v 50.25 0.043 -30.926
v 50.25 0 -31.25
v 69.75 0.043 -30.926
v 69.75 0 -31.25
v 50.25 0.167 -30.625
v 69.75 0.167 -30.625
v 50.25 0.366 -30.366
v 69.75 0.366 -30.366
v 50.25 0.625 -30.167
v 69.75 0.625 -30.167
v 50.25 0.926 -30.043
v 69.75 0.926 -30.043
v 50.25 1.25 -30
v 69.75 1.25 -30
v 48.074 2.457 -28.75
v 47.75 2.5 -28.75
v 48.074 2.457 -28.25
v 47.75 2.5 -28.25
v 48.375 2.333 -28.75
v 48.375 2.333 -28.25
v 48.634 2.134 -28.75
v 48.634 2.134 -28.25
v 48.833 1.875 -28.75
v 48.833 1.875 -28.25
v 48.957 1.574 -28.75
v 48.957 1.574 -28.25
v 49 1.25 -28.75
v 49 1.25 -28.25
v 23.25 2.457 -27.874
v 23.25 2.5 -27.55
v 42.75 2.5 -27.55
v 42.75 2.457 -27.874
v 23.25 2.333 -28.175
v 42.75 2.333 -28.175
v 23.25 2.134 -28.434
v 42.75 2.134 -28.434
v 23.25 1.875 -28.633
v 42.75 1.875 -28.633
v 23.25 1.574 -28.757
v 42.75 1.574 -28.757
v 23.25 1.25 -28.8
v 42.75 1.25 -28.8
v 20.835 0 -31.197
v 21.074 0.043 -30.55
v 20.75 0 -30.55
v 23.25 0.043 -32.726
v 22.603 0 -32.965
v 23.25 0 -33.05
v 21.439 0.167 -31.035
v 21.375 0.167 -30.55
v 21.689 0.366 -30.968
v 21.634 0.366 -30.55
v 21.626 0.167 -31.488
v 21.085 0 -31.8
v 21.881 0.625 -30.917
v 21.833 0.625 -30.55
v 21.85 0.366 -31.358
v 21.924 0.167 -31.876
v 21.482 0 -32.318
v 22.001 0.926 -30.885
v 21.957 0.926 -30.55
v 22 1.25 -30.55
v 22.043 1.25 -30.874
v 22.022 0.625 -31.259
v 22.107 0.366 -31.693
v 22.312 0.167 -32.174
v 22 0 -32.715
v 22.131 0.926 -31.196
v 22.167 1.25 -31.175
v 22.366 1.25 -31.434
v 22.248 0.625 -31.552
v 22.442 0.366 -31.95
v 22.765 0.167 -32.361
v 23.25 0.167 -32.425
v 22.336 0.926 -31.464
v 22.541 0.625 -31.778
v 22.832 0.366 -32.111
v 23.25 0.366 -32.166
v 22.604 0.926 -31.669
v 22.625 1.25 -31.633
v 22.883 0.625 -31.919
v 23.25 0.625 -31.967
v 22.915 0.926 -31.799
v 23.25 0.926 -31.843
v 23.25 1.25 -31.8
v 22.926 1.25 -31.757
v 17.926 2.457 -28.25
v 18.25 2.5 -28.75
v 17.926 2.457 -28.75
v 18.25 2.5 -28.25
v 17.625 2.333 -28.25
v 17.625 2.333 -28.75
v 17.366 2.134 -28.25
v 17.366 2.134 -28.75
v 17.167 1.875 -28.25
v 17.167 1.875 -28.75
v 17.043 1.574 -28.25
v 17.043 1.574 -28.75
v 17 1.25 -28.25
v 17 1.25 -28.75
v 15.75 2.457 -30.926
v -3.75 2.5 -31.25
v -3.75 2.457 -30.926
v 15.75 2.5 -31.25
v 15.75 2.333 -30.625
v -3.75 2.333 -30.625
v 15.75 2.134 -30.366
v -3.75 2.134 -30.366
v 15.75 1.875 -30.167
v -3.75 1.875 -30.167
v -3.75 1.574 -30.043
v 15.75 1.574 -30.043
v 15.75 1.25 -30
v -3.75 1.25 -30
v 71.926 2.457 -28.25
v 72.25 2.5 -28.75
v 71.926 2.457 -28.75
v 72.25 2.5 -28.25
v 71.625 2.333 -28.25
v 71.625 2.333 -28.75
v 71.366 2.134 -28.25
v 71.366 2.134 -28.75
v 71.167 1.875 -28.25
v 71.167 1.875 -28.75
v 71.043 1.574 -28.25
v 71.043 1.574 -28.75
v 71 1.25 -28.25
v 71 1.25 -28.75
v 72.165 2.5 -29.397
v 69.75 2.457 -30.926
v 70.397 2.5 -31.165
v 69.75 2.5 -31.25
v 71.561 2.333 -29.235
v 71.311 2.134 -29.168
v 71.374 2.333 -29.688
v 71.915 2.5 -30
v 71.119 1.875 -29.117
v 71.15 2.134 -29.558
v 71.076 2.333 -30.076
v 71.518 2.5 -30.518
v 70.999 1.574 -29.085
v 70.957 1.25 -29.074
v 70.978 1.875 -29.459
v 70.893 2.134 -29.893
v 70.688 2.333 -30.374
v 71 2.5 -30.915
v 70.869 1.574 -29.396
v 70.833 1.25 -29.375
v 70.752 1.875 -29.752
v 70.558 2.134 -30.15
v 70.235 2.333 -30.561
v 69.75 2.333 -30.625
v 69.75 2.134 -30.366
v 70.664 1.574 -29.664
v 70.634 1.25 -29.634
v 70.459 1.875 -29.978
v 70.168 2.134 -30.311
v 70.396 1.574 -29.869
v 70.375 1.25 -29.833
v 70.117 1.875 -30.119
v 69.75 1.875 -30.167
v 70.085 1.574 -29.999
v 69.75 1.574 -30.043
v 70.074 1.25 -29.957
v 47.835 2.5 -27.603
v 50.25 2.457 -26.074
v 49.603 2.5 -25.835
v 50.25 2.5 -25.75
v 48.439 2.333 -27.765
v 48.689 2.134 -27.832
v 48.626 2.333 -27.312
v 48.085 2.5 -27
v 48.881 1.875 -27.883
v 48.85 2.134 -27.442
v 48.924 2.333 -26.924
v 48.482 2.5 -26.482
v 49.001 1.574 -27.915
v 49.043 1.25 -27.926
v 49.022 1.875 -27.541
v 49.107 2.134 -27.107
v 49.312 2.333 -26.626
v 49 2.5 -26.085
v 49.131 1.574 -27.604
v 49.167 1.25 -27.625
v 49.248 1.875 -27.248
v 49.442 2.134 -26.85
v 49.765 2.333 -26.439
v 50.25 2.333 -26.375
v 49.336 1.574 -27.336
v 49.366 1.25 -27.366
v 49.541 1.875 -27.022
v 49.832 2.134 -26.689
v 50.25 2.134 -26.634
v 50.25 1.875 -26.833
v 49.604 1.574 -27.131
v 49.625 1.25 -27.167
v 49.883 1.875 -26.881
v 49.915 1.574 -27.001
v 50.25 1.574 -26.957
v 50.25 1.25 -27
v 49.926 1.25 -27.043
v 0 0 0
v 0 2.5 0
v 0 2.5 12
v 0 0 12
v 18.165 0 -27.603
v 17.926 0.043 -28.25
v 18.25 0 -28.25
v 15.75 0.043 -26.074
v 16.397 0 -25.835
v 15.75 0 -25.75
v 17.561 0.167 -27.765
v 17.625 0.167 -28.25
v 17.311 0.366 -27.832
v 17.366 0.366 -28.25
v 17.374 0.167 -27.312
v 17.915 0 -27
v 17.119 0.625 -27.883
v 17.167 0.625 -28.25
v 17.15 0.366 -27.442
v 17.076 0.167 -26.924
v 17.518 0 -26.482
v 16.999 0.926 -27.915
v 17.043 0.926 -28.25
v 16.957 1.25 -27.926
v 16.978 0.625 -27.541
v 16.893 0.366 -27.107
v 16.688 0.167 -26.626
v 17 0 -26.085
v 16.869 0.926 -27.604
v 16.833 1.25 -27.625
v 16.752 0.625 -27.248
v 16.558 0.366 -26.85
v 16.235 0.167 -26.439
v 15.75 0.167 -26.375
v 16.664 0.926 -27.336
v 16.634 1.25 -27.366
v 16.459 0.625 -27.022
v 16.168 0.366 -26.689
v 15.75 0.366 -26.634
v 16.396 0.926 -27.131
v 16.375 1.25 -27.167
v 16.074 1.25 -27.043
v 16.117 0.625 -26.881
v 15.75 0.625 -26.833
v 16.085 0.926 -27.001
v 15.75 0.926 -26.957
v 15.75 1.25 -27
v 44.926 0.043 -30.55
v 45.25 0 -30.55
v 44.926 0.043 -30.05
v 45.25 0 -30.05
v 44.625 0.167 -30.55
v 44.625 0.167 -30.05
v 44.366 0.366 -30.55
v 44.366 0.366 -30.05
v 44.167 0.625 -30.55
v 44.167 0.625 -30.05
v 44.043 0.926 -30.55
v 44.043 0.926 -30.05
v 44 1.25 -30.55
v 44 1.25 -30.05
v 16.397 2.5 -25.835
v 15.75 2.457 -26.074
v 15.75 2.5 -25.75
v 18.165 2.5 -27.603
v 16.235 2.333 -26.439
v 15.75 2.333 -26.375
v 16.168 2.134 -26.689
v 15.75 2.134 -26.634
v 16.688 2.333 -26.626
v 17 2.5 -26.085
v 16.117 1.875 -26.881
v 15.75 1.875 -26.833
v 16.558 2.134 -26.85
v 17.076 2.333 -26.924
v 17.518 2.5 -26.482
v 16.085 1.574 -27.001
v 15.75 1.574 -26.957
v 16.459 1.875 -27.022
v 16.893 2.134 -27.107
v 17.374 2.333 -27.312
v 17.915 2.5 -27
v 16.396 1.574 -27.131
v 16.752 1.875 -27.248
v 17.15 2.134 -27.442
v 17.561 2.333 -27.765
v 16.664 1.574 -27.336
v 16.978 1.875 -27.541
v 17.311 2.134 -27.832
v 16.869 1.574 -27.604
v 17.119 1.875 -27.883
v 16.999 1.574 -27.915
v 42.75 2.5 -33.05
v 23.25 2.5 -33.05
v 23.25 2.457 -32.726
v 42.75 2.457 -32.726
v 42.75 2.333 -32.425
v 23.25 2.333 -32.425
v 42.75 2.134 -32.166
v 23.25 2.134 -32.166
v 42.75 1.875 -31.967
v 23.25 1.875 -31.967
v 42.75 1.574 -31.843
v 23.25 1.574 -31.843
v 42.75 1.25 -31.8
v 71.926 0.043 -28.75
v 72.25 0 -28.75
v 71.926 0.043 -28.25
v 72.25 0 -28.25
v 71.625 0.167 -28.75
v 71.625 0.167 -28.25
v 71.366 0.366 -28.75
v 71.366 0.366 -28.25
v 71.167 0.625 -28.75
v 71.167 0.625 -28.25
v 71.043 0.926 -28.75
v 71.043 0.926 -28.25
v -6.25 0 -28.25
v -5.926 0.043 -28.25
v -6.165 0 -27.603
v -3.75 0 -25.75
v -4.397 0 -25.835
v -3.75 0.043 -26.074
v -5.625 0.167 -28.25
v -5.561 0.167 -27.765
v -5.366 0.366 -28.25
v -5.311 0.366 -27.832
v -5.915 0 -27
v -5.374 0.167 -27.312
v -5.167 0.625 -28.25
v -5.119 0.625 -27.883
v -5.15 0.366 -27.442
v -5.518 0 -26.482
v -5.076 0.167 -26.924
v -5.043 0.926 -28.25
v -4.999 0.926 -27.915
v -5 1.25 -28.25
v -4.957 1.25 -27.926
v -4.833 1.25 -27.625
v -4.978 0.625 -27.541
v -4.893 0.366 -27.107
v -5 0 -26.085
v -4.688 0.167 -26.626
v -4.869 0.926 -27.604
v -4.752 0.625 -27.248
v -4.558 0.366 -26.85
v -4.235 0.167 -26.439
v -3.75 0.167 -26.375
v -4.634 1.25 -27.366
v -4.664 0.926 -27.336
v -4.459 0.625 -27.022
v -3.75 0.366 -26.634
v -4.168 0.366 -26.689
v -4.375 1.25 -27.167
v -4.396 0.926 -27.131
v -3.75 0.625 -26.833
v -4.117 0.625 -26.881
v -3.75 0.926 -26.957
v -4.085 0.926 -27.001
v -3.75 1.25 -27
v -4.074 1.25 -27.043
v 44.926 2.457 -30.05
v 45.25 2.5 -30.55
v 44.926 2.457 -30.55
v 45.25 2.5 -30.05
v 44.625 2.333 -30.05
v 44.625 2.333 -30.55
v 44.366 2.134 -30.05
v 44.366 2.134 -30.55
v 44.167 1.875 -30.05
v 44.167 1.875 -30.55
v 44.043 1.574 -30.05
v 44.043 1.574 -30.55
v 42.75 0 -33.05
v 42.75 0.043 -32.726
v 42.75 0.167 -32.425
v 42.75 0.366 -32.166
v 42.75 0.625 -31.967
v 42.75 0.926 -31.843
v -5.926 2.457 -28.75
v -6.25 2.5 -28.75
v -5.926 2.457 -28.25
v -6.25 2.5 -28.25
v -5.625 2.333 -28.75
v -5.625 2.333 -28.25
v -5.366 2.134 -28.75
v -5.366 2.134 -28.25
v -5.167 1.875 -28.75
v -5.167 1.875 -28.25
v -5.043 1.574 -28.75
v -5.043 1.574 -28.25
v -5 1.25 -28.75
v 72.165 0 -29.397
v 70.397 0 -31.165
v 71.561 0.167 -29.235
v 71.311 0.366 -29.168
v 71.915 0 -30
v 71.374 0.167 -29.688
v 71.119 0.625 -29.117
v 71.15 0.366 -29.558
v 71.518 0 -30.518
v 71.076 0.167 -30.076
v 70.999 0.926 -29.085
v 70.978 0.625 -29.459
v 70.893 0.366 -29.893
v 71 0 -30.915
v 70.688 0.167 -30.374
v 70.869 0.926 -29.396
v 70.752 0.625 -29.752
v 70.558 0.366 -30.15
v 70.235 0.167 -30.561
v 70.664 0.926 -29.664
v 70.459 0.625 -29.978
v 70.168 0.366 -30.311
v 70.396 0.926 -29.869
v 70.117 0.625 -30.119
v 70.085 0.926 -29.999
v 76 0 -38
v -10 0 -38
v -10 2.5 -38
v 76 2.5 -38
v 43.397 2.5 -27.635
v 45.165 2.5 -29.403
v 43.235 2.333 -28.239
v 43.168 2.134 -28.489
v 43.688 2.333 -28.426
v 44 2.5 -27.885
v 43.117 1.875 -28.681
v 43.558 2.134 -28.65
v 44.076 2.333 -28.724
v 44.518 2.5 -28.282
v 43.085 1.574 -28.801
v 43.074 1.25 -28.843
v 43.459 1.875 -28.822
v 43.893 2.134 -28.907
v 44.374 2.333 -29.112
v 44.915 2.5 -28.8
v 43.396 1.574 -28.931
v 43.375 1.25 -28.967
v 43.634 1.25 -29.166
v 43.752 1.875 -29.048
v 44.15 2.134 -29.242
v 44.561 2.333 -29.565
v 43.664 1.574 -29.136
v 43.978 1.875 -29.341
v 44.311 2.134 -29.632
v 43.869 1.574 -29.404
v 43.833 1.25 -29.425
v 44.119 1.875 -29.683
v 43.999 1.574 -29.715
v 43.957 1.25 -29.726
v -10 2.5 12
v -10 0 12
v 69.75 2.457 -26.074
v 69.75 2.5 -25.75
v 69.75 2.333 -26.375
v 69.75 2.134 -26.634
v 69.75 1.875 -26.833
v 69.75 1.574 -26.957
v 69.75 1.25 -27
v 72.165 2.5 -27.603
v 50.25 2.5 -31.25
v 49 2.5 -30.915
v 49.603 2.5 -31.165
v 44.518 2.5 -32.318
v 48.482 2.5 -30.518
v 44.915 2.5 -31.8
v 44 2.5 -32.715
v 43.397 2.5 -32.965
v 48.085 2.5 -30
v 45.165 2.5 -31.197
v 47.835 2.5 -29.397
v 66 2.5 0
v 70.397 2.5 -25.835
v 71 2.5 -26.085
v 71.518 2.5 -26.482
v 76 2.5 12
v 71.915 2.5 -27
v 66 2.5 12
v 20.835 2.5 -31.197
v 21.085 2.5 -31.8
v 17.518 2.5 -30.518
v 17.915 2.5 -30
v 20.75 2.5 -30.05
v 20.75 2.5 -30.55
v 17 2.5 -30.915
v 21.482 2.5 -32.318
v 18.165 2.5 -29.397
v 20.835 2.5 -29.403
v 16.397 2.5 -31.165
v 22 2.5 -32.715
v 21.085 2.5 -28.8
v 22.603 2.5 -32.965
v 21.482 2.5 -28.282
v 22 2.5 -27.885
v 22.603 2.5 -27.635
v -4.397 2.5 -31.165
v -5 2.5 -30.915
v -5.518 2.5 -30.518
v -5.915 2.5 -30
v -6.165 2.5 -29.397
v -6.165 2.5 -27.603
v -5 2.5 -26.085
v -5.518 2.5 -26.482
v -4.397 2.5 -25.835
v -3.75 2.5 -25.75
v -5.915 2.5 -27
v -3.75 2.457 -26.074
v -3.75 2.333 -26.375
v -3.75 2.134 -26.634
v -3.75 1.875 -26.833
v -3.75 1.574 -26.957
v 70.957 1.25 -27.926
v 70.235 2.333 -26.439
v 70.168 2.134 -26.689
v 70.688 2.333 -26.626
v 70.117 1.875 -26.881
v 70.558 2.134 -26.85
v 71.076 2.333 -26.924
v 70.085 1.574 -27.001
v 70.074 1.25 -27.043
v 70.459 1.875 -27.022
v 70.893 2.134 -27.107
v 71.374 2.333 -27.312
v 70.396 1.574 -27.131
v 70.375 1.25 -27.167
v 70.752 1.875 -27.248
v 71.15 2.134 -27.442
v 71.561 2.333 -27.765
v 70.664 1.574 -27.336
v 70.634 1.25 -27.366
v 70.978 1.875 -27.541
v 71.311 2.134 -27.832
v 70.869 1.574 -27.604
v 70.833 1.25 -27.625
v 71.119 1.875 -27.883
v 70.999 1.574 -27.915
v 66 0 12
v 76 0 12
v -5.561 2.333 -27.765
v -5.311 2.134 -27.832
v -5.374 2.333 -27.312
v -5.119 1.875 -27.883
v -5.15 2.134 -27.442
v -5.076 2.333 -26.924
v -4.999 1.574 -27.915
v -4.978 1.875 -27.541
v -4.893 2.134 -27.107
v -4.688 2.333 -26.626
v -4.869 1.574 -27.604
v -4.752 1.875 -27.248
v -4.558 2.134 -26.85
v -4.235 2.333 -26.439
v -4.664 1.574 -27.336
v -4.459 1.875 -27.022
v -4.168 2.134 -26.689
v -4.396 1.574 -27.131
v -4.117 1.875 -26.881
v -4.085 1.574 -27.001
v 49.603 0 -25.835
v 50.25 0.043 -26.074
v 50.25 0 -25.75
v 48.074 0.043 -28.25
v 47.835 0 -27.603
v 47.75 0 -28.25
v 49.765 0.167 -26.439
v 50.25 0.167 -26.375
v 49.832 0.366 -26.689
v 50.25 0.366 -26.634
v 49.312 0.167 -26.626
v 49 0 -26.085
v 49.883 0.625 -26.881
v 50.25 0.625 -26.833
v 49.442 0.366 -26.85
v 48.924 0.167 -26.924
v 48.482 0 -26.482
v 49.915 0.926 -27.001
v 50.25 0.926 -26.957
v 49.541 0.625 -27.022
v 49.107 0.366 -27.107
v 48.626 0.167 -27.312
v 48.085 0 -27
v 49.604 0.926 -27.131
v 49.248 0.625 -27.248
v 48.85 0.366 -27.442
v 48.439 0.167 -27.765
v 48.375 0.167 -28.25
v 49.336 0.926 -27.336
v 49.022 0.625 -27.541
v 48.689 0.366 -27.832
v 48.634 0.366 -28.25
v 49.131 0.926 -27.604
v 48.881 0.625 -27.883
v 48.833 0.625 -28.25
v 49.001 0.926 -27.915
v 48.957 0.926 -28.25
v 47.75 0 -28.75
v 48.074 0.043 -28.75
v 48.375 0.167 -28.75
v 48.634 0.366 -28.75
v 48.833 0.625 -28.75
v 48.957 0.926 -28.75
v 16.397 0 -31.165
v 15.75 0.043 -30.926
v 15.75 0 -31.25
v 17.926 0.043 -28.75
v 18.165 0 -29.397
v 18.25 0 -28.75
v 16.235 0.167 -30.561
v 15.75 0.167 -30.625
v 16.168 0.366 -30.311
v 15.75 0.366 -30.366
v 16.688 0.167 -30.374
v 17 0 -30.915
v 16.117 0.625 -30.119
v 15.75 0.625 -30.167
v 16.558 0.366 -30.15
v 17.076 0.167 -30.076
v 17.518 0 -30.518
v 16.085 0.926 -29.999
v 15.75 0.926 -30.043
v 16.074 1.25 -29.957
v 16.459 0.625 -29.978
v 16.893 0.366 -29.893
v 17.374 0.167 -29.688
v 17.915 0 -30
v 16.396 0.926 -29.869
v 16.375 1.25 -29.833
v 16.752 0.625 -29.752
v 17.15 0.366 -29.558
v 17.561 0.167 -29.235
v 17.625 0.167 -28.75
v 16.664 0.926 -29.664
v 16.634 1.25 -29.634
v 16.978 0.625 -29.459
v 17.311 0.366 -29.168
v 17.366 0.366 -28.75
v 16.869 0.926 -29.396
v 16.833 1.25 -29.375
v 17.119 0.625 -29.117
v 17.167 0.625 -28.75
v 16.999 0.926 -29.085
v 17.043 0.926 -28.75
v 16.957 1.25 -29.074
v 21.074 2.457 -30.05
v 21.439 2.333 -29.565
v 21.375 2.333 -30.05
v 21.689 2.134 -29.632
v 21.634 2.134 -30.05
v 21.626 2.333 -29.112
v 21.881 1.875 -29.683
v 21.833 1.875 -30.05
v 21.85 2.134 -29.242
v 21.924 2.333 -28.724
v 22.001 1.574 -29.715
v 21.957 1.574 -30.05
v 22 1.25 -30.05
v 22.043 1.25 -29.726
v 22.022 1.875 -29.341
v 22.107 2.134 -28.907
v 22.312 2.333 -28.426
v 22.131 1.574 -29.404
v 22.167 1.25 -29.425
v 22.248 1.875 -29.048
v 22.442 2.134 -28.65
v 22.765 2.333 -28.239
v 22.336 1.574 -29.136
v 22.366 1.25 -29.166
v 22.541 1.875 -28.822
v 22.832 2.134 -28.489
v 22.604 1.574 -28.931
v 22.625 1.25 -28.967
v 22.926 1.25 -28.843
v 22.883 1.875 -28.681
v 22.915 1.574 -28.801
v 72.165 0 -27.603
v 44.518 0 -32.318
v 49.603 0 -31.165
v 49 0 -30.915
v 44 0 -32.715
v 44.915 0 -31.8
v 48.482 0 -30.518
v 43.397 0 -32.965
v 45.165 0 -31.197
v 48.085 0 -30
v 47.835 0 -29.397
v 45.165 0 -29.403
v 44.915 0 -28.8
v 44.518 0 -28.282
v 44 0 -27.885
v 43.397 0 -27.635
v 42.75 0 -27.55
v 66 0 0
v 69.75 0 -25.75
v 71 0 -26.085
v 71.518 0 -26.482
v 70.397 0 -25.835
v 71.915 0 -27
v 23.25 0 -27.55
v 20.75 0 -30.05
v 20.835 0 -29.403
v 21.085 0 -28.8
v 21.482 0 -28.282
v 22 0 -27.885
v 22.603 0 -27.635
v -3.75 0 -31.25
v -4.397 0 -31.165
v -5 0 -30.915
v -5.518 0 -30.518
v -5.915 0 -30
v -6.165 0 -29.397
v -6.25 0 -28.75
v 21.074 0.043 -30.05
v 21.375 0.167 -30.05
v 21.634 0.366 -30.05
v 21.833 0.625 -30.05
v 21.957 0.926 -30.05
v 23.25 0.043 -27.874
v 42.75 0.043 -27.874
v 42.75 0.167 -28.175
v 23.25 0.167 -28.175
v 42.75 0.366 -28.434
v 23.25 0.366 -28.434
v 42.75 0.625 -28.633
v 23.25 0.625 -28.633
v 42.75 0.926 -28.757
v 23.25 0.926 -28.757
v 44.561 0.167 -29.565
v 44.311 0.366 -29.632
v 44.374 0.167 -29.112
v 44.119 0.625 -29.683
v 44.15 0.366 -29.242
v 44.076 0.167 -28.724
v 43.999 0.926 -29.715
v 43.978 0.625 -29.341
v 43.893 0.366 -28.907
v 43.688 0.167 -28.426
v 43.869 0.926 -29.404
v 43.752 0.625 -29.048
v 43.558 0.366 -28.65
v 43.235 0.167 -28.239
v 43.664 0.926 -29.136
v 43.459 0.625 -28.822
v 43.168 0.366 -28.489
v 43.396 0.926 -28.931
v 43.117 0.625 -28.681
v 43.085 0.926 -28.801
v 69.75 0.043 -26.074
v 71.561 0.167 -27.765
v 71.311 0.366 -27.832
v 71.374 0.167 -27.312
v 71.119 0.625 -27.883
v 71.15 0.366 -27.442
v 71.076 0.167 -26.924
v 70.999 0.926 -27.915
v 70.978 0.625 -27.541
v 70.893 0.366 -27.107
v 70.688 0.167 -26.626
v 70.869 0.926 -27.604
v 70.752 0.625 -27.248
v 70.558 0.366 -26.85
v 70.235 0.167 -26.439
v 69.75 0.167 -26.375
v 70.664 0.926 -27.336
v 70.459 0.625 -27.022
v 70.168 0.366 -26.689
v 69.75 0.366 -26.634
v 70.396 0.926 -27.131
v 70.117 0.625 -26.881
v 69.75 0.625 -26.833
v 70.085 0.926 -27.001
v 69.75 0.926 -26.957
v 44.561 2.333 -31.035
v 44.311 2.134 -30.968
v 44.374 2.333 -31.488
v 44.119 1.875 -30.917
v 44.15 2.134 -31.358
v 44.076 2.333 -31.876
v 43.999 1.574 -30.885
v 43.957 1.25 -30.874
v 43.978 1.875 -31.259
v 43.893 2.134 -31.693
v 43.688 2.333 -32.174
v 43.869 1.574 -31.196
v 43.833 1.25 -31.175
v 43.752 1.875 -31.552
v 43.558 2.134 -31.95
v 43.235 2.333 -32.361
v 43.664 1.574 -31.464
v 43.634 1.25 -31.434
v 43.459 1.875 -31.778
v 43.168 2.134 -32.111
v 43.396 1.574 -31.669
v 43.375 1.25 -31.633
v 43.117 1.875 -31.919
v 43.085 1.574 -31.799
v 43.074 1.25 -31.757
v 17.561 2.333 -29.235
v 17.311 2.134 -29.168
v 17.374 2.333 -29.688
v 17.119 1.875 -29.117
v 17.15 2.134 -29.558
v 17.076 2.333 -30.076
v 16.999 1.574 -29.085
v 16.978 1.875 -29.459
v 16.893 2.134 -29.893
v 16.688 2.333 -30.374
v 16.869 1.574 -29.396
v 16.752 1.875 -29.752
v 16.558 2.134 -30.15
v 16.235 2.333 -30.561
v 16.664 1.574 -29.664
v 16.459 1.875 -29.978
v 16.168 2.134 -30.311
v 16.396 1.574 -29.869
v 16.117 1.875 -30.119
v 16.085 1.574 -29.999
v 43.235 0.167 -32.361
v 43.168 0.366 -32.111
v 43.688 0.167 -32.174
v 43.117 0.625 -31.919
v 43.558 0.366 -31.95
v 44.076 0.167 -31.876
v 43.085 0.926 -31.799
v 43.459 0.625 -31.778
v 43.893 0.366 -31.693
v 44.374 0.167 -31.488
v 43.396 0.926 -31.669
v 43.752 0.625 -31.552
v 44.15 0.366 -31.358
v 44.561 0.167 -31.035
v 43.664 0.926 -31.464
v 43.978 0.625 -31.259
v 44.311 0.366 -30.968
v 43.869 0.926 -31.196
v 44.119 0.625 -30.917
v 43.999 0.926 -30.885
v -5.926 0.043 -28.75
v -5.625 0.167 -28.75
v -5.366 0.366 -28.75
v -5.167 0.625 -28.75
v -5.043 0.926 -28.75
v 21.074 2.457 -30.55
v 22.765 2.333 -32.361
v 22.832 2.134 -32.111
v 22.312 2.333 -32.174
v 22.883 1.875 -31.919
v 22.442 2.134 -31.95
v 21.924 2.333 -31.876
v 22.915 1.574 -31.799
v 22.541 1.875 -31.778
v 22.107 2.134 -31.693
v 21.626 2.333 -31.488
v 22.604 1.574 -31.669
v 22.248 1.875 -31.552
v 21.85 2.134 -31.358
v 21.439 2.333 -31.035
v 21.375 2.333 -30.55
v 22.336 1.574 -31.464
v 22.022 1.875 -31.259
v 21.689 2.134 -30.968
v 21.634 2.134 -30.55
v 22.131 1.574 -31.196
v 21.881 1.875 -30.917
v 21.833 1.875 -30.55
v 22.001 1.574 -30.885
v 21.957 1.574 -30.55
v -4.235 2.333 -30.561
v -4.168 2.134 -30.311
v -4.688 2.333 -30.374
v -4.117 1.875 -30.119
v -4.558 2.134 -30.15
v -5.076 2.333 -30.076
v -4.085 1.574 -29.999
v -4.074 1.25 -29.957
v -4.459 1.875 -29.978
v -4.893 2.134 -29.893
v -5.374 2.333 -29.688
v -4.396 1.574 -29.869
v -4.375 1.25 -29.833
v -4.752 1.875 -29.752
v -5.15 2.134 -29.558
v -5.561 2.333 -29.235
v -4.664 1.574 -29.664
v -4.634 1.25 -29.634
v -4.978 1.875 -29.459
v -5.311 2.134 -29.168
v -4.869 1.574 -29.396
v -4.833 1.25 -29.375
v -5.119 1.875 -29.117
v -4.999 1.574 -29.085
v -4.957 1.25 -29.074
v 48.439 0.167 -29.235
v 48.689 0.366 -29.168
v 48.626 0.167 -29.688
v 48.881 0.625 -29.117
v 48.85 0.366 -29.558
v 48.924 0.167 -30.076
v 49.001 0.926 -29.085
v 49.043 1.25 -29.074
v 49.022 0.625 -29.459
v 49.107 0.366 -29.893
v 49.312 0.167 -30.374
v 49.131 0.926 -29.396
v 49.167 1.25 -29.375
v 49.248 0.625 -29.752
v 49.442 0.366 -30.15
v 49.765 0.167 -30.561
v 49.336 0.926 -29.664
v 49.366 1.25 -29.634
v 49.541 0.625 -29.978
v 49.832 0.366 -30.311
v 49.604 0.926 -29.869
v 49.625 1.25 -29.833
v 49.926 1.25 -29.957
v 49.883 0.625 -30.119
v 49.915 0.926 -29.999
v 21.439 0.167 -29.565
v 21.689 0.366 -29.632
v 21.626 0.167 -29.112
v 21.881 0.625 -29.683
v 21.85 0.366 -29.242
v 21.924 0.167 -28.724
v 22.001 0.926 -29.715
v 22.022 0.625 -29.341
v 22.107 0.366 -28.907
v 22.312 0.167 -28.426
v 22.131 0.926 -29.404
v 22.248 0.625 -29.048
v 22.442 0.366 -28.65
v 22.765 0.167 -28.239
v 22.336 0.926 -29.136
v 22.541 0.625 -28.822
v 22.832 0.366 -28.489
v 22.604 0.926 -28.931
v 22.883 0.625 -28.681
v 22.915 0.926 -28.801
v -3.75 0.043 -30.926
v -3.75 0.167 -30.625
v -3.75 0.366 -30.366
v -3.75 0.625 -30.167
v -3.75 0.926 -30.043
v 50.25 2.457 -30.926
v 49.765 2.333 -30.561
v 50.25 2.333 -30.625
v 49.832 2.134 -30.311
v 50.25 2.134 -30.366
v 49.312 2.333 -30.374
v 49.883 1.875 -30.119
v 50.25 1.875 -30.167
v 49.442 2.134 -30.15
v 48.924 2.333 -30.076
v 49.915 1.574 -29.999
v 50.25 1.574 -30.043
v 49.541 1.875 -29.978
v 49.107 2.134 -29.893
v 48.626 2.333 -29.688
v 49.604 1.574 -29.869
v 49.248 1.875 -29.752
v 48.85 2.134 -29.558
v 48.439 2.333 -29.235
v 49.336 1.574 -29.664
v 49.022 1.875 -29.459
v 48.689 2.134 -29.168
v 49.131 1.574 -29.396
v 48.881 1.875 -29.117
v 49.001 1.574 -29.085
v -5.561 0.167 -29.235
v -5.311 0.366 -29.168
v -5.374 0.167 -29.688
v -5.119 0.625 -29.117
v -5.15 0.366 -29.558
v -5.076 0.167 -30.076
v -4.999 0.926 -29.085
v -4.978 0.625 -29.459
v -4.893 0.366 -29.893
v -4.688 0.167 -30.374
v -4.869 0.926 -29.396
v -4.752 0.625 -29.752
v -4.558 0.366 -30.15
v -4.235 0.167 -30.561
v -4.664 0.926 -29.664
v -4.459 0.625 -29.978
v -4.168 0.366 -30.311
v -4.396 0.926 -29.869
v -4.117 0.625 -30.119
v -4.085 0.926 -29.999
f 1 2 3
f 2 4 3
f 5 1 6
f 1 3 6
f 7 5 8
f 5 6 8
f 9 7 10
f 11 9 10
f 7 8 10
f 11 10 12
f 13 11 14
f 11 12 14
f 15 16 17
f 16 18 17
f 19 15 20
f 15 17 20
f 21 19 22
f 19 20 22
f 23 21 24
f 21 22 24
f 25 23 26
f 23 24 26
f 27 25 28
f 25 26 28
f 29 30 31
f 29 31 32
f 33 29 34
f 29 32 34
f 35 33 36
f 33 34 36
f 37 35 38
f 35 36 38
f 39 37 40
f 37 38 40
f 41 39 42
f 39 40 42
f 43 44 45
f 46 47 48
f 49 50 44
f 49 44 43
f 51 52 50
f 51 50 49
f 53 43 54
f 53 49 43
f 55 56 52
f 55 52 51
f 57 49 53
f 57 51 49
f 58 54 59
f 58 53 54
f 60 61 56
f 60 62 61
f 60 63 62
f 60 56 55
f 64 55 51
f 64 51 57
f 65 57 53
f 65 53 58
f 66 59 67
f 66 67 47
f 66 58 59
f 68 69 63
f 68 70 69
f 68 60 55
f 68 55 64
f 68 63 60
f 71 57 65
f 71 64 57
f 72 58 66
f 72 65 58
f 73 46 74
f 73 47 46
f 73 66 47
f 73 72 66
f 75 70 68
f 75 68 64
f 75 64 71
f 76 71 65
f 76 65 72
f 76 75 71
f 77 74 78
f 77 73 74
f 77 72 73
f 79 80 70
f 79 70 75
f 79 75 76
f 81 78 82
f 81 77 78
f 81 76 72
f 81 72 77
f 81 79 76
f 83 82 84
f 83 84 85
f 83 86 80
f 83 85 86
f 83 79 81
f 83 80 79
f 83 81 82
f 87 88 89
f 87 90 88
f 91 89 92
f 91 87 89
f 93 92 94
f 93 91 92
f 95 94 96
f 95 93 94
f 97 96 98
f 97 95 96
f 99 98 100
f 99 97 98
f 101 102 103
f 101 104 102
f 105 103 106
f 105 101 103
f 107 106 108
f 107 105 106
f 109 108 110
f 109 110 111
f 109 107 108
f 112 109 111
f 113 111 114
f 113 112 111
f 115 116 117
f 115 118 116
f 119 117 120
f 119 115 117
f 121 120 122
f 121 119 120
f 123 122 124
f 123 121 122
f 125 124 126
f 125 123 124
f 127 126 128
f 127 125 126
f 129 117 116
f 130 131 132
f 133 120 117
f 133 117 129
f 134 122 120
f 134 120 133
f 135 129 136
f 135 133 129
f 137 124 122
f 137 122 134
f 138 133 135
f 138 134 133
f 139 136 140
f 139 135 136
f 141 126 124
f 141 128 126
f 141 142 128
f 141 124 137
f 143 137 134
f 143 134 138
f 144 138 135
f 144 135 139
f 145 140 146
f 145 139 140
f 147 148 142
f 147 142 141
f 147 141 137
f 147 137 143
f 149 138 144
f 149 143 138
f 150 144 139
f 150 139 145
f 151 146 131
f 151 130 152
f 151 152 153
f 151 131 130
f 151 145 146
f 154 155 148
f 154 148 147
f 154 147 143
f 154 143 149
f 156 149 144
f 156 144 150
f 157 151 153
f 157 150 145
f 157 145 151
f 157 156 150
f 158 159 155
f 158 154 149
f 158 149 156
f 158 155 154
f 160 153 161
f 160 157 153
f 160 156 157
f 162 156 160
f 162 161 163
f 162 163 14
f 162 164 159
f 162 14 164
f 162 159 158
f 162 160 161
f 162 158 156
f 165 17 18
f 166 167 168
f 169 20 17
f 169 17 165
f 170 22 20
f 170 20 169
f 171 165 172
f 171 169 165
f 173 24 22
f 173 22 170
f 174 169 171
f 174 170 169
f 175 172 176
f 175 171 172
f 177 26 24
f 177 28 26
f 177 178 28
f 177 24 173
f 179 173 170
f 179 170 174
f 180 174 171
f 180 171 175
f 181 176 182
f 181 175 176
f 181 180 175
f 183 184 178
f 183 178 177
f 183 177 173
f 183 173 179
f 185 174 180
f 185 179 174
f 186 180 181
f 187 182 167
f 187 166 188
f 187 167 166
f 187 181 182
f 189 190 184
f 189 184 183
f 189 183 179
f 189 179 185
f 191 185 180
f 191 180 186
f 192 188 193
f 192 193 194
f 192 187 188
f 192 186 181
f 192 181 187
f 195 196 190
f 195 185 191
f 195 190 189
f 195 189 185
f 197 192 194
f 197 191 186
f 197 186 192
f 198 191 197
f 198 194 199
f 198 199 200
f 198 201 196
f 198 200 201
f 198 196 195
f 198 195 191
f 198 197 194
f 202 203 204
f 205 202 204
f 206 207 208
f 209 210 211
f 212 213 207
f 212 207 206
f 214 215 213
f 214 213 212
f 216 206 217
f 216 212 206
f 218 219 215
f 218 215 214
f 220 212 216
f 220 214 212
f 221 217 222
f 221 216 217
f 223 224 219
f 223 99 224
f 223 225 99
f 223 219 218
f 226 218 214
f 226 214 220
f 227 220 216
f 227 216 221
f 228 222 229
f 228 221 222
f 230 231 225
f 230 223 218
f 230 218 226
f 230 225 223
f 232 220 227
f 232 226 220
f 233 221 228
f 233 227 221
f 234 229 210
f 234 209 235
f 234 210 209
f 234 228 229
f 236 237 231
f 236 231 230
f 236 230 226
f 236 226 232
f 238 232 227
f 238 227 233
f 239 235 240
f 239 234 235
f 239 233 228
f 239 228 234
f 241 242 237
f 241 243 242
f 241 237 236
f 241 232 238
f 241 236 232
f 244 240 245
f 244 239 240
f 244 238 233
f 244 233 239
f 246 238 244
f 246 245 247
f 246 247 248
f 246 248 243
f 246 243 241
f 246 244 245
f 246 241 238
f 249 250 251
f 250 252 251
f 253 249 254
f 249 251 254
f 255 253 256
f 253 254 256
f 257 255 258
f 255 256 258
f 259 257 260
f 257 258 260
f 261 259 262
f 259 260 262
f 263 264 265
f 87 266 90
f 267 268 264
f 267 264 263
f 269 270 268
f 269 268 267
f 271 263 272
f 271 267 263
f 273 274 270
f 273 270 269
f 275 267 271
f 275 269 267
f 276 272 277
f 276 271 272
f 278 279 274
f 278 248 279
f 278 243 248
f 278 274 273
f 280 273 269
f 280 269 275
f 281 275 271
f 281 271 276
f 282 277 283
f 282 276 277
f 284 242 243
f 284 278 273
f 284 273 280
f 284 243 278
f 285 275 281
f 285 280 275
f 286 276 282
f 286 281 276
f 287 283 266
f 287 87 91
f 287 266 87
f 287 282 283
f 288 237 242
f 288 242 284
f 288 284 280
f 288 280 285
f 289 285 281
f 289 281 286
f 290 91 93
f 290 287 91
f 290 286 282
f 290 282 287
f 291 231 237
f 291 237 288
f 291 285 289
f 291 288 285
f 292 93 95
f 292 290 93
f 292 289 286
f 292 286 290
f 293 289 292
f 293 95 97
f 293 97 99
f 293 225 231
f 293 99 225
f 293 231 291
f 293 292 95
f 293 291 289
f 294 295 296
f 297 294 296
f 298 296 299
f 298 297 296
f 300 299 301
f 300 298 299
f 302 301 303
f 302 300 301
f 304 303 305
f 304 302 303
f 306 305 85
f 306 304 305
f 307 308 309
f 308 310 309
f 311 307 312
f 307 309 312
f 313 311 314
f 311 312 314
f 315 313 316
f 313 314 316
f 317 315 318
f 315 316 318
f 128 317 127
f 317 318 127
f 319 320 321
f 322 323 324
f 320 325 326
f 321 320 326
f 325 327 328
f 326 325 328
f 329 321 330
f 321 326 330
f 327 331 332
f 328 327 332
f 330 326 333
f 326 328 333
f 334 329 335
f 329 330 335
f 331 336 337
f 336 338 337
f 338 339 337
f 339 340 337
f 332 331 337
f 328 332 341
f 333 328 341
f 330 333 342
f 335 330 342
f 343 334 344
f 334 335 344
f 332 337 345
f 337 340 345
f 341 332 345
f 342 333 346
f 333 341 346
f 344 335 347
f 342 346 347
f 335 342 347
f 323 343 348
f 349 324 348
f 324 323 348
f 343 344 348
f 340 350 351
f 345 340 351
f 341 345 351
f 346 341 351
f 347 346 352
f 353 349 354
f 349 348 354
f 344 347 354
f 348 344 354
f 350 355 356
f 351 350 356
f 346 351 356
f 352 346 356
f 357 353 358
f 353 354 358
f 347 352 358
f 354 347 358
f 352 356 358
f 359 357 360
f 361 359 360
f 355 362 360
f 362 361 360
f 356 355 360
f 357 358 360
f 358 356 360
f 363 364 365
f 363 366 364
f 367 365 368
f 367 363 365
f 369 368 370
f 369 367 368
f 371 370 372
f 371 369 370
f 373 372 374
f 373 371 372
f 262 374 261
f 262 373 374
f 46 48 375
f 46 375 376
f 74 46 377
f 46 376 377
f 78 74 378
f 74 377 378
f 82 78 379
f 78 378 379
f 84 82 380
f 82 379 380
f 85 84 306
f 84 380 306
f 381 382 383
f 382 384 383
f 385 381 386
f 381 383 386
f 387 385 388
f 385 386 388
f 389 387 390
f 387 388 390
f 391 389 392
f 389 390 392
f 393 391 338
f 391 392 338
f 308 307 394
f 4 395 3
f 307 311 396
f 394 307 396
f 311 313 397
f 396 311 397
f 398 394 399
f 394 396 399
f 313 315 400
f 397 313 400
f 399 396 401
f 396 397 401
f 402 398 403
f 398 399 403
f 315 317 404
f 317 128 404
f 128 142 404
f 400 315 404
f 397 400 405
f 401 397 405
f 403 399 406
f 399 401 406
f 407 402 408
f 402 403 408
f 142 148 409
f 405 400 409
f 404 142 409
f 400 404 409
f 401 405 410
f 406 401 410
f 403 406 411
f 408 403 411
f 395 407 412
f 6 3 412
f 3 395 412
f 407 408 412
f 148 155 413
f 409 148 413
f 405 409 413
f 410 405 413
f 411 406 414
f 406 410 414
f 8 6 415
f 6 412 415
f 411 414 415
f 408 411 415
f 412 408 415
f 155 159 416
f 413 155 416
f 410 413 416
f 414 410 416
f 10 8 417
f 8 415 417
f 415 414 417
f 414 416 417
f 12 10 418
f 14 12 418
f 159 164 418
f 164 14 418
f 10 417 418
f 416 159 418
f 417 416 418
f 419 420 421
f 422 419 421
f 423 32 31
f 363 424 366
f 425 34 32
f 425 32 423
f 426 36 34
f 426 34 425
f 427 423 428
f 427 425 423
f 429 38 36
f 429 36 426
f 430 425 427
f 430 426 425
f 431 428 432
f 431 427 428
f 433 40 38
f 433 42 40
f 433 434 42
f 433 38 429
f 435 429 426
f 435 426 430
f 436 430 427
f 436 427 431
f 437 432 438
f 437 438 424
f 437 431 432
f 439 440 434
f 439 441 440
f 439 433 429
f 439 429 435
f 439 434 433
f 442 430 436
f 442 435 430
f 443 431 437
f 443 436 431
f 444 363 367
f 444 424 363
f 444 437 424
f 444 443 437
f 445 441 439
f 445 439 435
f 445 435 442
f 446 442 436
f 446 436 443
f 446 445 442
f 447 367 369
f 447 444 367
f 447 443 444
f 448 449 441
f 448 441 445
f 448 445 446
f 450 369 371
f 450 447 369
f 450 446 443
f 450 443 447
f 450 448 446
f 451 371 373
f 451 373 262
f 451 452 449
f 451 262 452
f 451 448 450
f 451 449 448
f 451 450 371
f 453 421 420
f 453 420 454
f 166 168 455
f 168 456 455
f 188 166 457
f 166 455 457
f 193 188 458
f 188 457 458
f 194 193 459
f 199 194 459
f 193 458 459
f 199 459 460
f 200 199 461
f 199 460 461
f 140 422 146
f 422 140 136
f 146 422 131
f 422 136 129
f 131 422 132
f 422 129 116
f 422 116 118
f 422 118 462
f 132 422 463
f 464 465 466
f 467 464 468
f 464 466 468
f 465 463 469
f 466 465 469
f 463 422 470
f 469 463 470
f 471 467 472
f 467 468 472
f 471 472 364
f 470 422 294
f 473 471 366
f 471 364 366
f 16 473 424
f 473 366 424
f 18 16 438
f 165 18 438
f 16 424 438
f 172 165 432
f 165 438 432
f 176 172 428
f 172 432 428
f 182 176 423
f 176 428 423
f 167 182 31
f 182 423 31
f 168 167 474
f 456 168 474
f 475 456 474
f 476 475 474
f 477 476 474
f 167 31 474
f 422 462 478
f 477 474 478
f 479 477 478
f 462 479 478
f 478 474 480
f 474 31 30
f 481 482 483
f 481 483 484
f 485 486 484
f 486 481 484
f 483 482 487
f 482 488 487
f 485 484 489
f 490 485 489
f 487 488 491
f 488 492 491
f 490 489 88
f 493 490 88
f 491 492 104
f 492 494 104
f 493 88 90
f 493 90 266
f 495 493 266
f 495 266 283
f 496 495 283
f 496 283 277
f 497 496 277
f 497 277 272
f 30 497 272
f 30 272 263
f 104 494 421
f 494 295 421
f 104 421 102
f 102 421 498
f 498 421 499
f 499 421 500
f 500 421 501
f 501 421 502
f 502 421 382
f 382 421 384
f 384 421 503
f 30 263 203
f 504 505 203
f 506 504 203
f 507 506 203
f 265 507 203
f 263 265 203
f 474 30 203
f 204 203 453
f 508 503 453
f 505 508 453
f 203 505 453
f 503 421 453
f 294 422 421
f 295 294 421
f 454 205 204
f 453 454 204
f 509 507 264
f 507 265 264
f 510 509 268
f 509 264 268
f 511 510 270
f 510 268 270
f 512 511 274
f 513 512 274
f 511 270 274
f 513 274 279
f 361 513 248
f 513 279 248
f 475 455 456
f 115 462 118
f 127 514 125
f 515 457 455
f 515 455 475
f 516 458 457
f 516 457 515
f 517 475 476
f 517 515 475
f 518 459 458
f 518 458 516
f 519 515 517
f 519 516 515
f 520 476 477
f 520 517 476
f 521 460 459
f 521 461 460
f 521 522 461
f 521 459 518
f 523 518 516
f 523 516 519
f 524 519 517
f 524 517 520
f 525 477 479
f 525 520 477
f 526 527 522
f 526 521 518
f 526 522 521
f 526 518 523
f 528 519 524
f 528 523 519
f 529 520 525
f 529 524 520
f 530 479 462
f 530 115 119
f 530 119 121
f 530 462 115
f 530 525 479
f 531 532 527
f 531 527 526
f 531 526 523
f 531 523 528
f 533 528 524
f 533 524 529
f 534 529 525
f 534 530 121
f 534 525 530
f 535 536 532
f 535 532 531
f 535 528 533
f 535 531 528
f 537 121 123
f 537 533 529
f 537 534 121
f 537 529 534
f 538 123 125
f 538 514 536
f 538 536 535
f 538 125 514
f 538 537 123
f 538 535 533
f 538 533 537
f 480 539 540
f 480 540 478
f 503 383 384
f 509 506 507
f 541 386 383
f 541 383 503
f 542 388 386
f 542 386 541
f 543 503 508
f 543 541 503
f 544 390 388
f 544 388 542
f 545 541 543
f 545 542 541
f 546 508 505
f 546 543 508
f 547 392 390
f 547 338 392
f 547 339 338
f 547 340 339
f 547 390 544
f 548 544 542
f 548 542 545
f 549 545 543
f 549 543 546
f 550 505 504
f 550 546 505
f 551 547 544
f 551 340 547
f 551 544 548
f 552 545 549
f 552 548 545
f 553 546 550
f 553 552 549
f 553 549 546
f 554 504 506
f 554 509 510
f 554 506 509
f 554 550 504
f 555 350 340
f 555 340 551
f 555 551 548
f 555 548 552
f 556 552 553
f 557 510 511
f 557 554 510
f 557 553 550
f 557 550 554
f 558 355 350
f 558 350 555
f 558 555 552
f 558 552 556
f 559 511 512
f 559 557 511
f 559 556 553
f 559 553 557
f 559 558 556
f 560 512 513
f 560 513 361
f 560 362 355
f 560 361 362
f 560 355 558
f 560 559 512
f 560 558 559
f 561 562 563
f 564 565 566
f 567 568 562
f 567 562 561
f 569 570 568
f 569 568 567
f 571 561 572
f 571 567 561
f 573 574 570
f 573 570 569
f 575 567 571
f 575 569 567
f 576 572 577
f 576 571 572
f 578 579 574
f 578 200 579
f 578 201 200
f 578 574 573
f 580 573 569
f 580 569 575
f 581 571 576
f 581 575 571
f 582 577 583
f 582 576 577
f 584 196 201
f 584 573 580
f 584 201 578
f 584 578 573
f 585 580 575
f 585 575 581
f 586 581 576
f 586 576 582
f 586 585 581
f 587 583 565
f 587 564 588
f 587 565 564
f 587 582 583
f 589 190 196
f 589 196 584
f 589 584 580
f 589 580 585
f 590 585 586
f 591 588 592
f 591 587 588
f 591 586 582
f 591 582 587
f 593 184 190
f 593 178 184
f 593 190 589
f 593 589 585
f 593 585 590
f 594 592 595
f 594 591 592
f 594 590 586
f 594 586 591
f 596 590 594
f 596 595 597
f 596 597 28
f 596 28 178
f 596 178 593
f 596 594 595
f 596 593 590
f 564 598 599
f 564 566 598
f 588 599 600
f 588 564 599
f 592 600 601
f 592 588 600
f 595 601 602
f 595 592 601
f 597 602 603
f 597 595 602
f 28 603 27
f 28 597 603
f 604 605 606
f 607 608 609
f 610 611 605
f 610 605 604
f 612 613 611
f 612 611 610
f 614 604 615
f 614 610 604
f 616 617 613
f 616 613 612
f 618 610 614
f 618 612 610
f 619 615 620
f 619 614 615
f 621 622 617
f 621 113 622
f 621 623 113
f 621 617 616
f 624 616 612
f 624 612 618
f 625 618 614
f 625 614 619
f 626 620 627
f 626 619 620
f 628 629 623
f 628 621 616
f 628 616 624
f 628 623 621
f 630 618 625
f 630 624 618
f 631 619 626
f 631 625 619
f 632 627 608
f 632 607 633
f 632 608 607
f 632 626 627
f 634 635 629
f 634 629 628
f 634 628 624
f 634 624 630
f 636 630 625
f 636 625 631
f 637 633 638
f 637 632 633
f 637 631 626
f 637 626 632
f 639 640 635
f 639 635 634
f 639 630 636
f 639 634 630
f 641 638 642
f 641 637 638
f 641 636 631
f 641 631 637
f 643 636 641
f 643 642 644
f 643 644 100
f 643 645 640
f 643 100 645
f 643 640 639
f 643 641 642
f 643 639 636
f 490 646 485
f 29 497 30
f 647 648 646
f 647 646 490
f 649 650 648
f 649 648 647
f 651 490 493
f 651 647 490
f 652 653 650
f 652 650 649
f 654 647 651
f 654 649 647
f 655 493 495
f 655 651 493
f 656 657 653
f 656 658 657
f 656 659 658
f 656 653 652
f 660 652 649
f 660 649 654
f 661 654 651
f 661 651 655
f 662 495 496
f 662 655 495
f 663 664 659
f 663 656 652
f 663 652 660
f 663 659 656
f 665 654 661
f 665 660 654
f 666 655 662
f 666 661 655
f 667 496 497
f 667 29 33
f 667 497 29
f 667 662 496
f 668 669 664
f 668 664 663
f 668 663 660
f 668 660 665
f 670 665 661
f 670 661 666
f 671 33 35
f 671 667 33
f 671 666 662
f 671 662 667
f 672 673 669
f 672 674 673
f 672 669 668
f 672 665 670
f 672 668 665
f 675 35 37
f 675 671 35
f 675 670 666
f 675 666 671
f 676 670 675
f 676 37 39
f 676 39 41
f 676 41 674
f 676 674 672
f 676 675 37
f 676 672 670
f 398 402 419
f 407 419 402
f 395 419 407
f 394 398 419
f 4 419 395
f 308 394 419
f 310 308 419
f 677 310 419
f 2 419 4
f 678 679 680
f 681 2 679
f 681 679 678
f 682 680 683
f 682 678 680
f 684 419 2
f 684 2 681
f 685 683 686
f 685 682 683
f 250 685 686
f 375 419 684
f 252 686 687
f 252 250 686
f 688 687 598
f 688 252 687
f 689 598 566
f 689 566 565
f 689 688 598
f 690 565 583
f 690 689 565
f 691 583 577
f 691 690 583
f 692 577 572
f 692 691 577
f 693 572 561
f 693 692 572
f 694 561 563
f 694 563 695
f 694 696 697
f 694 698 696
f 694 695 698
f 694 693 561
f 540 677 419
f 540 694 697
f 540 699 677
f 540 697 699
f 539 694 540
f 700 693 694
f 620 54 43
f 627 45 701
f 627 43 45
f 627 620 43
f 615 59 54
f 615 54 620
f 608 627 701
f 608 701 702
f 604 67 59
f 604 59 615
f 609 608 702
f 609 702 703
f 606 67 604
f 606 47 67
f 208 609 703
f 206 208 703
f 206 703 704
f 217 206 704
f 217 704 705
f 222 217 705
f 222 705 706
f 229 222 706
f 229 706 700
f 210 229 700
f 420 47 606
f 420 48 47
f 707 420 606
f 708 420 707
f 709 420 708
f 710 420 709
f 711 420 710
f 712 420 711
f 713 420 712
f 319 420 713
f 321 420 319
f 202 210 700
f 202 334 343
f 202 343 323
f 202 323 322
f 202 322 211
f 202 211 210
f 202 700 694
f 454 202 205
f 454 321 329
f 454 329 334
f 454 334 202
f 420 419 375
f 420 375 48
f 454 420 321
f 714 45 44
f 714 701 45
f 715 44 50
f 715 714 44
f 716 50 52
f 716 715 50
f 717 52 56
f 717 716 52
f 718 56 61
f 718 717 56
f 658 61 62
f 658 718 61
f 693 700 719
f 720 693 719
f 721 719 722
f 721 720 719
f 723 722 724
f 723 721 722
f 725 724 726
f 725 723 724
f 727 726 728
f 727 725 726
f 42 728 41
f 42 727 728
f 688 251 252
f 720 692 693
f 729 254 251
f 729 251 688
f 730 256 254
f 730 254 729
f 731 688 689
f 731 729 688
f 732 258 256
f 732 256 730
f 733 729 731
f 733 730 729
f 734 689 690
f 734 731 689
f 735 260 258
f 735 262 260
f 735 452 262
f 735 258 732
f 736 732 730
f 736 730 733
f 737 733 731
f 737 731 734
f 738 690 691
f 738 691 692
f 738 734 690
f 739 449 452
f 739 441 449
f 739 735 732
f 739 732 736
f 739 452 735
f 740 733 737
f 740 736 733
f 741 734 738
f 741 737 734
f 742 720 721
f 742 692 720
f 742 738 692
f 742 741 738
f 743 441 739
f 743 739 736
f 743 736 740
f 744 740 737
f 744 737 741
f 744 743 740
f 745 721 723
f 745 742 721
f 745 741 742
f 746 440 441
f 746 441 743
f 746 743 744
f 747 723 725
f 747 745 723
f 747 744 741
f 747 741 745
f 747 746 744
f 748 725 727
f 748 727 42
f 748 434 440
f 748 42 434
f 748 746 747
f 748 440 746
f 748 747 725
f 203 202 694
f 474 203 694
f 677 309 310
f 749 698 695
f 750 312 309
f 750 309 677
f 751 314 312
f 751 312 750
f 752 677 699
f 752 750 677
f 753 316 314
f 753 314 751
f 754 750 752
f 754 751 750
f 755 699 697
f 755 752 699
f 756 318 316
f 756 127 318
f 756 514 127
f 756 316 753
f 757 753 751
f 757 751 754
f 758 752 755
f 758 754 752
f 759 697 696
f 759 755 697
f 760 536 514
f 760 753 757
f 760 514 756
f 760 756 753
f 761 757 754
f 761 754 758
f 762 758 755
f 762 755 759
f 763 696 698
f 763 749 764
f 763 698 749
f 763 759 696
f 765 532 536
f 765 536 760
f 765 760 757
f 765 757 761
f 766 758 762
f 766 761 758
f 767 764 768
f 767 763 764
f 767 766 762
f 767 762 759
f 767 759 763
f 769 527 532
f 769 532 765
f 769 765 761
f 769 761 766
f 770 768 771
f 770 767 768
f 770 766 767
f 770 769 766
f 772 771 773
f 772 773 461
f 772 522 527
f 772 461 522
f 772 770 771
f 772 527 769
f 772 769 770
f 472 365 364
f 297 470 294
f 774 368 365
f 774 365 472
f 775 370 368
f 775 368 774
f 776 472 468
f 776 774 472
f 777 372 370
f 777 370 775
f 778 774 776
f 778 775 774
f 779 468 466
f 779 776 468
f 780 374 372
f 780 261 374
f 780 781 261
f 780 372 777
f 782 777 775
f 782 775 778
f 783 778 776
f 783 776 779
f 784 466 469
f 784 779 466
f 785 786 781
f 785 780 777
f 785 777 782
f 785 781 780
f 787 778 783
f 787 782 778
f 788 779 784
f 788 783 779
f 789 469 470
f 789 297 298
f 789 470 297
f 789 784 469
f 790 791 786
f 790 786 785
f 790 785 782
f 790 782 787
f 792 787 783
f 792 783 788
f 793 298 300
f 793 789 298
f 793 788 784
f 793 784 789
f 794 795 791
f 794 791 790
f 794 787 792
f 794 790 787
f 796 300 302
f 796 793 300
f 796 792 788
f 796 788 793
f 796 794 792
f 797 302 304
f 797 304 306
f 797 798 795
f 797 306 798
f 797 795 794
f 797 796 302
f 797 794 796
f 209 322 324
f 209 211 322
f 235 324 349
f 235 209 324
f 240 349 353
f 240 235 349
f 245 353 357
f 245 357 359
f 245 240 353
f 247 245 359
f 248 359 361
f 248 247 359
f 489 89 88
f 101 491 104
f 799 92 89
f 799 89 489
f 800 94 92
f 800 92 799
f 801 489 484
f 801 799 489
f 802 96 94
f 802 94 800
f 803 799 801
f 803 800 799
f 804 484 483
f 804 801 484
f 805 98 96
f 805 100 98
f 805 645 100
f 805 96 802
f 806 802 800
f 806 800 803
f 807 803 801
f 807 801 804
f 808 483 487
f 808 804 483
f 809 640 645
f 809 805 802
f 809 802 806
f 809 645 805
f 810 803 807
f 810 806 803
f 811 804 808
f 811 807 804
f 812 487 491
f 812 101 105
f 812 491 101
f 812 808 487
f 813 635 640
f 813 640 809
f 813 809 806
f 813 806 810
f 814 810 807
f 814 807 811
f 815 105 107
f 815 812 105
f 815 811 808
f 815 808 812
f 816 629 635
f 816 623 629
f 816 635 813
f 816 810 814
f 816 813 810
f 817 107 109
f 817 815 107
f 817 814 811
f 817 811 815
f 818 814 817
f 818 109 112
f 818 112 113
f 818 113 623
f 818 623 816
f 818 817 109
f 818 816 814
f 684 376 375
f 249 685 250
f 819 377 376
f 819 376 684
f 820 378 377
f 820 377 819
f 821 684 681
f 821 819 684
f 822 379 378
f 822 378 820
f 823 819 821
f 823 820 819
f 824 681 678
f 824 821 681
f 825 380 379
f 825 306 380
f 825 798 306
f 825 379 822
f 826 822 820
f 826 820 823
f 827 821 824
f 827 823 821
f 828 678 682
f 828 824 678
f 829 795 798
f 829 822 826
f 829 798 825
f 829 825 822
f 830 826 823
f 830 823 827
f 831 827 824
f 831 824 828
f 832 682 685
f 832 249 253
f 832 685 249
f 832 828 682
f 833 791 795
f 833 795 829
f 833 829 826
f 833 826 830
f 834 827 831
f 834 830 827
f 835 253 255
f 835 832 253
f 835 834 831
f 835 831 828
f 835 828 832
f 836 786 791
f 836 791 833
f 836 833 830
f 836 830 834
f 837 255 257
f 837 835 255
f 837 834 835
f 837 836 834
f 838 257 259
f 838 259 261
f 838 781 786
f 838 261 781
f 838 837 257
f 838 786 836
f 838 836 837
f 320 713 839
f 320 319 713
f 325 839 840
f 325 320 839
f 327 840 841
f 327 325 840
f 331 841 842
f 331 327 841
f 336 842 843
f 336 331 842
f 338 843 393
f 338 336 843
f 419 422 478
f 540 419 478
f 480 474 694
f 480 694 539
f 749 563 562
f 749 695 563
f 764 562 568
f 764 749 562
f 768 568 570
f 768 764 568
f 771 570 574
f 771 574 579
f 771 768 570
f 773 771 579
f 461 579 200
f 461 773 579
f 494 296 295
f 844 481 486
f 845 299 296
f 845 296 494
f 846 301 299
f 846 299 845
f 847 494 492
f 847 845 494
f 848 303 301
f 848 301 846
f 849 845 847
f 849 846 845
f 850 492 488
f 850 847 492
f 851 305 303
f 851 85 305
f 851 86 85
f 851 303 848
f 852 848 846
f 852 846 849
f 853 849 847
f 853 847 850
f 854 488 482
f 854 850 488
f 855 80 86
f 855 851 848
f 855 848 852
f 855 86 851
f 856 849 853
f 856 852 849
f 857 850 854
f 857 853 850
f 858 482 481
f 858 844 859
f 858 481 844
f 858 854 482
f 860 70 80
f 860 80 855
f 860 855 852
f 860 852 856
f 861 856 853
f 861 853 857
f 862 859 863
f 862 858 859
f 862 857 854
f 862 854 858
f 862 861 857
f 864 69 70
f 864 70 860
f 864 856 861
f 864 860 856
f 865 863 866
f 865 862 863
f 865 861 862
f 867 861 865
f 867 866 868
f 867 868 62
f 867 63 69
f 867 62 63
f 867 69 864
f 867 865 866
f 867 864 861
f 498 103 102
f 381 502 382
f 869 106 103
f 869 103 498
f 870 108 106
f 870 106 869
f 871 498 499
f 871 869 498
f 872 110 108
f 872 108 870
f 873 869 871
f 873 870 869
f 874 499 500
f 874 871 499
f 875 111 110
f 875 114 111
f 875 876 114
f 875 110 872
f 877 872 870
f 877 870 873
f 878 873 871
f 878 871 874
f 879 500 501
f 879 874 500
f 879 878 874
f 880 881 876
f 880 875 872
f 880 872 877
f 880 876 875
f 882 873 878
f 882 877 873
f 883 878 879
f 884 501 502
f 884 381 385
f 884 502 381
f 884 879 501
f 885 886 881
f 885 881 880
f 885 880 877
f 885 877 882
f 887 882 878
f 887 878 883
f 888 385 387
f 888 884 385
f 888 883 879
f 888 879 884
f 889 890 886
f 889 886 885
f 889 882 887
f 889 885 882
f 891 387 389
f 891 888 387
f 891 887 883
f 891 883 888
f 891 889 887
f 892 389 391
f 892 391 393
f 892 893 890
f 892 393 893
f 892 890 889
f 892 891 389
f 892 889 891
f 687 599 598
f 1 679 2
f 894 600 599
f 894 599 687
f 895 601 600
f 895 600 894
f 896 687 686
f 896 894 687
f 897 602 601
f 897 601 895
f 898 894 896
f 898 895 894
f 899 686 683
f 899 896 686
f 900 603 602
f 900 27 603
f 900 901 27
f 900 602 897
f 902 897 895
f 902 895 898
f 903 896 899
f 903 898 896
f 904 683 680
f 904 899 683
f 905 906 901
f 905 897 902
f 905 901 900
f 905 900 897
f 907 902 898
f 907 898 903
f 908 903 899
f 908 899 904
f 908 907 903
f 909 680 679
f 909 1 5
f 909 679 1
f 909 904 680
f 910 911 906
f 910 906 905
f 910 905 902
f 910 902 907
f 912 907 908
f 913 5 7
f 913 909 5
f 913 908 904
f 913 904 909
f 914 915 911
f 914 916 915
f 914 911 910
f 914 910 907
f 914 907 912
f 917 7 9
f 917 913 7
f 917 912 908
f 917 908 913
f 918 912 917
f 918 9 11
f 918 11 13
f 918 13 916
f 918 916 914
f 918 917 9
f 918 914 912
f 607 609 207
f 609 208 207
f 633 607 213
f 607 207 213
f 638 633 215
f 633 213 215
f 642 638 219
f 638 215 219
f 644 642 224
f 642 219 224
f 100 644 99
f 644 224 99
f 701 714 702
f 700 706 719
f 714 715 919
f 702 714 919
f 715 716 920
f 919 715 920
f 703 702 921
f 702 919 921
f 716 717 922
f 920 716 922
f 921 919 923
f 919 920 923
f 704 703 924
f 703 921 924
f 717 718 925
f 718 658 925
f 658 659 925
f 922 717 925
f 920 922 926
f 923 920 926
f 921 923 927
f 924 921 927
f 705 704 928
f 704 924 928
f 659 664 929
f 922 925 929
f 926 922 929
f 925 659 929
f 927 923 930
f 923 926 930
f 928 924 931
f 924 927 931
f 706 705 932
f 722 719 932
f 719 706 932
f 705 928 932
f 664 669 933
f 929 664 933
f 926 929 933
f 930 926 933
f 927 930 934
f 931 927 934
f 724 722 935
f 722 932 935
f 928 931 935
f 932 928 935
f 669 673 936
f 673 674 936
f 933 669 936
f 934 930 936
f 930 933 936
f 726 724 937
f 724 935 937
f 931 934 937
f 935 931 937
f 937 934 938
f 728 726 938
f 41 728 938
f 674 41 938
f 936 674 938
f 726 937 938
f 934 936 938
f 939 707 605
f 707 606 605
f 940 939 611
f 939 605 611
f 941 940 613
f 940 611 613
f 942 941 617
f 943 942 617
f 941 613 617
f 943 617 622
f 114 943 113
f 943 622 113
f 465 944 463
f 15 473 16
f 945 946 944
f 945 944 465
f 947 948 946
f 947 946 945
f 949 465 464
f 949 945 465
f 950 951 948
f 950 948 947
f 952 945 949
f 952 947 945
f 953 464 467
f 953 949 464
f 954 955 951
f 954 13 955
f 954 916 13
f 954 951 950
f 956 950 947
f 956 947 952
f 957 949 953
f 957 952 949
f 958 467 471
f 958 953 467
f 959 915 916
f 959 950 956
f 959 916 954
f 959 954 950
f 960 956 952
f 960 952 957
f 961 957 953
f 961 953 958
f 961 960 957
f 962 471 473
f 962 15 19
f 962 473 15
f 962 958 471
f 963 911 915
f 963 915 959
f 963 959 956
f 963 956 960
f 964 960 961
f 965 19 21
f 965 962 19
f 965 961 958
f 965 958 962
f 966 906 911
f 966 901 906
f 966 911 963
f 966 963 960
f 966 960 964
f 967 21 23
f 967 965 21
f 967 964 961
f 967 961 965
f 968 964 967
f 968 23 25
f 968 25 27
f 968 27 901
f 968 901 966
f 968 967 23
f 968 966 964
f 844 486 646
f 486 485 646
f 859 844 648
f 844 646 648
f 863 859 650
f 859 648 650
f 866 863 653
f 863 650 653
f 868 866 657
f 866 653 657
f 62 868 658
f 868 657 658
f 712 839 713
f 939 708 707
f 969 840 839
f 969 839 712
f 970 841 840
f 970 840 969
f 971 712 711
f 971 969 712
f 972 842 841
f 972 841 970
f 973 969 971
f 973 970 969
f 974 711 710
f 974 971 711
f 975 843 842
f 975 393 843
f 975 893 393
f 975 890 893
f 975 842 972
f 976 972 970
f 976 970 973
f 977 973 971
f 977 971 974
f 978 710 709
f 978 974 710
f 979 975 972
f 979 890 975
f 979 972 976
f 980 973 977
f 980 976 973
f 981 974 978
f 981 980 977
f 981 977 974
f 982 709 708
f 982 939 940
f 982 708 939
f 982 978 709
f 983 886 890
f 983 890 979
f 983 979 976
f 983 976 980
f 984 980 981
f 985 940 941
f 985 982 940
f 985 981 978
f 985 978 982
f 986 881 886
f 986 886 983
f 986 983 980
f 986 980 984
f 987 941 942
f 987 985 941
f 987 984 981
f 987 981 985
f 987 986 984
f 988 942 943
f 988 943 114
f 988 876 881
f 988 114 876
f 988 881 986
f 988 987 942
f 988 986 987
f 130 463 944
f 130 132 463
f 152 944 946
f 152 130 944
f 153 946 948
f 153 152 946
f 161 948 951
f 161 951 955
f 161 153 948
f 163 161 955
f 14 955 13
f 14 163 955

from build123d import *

# Parameters (mm, degrees)
SKETCH1_W           = 66
SKETCH1_H           = 38
BOSS_EXTRUDE1_DEPTH = 2.5
SKETCH3_W           = 50
SKETCH3_H           = 2.5
BOSS_EXTRUDE2_DEPTH = 10
SKETCH2_W           = 22
SKETCH2_H           = 3
CUT_EXTRUDE2_DEPTH  = 86.007352623
FILLET1_R           = 1.25


with BuildPart() as part:
    # Sketch1 → Boss-Extrude1 (new body)
    with BuildSketch(Plane(origin=(0, 0, 0), x_dir=(1, 0, 0), z_dir=(0, 1, 0))):
        with Locations((33, 19)):
            Rectangle(SKETCH1_W, SKETCH1_H)
    extrude(amount=BOSS_EXTRUDE1_DEPTH)

    # Sketch3 → Boss-Extrude2 (add)
    with BuildSketch(Plane.ZY):
        with Locations((-13, 1.25)):
            Rectangle(SKETCH3_W, SKETCH3_H)
    boss_extrude2 = extrude(amount=BOSS_EXTRUDE2_DEPTH)

    # Mirror1: Boss-Extrude2 across plane
    add(boss_extrude2.mirror(Plane(origin=(33, 0, 0), x_dir=(0, 0, 1), z_dir=(1, 0, 0))))

    # Sketch2 → Cut-Extrude2 (cut, through all)
    with BuildSketch(Plane.XZ):
        with Locations((33, -30.3)):
            Rectangle(SKETCH2_W, SKETCH2_H)
        with Locations((6, -28.5)):
            Rectangle(SKETCH2_W, SKETCH2_H)
        with Locations((60, -28.5)):
            Rectangle(SKETCH2_W, SKETCH2_H)
    extrude(amount=-CUT_EXTRUDE2_DEPTH, mode=Mode.SUBTRACT)

    # Fillet1
    fillet1_edges = [part.edges().sort_by_distance(p)[0] for p in [
        (71, 2.5, -28.5),
        (71, 1.25, -27),
        (60, 2.5, -30),
        (71, 1.25, -30),
        (49, 2.5, -28.5),
        (49, 1.25, -30),
        (60, 2.5, -27),
        (49, 1.25, -27),
        (71, 0, -28.5),
        (60, 0, -27),
        (49, 0, -28.5),
        (60, 0, -30),
        (-5, 2.5, -28.5),
        (-5, 1.25, -30),
        (6, 2.5, -27),
        (-5, 1.25, -27),
        (17, 2.5, -28.5),
        (17, 1.25, -27),
        (6, 2.5, -30),
        (17, 1.25, -30),
        (-5, 0, -28.5),
        (6, 0, -30),
        (17, 0, -28.5),
        (6, 0, -27),
        (22, 2.5, -30.3),
        (22, 1.25, -31.8),
        (33, 2.5, -28.8),
        (22, 1.25, -28.8),
        (44, 2.5, -30.3),
        (44, 1.25, -28.8),
        (33, 2.5, -31.8),
        (44, 1.25, -31.8),
        (22, 0, -30.3),
        (33, 0, -31.8),
        (44, 0, -30.3),
        (33, 0, -28.8),
    ]]
    fillet(fillet1_edges, radius=FILLET1_R - 0.0001)  # a hair under: the kernel refuses the full size


solid = part.part
